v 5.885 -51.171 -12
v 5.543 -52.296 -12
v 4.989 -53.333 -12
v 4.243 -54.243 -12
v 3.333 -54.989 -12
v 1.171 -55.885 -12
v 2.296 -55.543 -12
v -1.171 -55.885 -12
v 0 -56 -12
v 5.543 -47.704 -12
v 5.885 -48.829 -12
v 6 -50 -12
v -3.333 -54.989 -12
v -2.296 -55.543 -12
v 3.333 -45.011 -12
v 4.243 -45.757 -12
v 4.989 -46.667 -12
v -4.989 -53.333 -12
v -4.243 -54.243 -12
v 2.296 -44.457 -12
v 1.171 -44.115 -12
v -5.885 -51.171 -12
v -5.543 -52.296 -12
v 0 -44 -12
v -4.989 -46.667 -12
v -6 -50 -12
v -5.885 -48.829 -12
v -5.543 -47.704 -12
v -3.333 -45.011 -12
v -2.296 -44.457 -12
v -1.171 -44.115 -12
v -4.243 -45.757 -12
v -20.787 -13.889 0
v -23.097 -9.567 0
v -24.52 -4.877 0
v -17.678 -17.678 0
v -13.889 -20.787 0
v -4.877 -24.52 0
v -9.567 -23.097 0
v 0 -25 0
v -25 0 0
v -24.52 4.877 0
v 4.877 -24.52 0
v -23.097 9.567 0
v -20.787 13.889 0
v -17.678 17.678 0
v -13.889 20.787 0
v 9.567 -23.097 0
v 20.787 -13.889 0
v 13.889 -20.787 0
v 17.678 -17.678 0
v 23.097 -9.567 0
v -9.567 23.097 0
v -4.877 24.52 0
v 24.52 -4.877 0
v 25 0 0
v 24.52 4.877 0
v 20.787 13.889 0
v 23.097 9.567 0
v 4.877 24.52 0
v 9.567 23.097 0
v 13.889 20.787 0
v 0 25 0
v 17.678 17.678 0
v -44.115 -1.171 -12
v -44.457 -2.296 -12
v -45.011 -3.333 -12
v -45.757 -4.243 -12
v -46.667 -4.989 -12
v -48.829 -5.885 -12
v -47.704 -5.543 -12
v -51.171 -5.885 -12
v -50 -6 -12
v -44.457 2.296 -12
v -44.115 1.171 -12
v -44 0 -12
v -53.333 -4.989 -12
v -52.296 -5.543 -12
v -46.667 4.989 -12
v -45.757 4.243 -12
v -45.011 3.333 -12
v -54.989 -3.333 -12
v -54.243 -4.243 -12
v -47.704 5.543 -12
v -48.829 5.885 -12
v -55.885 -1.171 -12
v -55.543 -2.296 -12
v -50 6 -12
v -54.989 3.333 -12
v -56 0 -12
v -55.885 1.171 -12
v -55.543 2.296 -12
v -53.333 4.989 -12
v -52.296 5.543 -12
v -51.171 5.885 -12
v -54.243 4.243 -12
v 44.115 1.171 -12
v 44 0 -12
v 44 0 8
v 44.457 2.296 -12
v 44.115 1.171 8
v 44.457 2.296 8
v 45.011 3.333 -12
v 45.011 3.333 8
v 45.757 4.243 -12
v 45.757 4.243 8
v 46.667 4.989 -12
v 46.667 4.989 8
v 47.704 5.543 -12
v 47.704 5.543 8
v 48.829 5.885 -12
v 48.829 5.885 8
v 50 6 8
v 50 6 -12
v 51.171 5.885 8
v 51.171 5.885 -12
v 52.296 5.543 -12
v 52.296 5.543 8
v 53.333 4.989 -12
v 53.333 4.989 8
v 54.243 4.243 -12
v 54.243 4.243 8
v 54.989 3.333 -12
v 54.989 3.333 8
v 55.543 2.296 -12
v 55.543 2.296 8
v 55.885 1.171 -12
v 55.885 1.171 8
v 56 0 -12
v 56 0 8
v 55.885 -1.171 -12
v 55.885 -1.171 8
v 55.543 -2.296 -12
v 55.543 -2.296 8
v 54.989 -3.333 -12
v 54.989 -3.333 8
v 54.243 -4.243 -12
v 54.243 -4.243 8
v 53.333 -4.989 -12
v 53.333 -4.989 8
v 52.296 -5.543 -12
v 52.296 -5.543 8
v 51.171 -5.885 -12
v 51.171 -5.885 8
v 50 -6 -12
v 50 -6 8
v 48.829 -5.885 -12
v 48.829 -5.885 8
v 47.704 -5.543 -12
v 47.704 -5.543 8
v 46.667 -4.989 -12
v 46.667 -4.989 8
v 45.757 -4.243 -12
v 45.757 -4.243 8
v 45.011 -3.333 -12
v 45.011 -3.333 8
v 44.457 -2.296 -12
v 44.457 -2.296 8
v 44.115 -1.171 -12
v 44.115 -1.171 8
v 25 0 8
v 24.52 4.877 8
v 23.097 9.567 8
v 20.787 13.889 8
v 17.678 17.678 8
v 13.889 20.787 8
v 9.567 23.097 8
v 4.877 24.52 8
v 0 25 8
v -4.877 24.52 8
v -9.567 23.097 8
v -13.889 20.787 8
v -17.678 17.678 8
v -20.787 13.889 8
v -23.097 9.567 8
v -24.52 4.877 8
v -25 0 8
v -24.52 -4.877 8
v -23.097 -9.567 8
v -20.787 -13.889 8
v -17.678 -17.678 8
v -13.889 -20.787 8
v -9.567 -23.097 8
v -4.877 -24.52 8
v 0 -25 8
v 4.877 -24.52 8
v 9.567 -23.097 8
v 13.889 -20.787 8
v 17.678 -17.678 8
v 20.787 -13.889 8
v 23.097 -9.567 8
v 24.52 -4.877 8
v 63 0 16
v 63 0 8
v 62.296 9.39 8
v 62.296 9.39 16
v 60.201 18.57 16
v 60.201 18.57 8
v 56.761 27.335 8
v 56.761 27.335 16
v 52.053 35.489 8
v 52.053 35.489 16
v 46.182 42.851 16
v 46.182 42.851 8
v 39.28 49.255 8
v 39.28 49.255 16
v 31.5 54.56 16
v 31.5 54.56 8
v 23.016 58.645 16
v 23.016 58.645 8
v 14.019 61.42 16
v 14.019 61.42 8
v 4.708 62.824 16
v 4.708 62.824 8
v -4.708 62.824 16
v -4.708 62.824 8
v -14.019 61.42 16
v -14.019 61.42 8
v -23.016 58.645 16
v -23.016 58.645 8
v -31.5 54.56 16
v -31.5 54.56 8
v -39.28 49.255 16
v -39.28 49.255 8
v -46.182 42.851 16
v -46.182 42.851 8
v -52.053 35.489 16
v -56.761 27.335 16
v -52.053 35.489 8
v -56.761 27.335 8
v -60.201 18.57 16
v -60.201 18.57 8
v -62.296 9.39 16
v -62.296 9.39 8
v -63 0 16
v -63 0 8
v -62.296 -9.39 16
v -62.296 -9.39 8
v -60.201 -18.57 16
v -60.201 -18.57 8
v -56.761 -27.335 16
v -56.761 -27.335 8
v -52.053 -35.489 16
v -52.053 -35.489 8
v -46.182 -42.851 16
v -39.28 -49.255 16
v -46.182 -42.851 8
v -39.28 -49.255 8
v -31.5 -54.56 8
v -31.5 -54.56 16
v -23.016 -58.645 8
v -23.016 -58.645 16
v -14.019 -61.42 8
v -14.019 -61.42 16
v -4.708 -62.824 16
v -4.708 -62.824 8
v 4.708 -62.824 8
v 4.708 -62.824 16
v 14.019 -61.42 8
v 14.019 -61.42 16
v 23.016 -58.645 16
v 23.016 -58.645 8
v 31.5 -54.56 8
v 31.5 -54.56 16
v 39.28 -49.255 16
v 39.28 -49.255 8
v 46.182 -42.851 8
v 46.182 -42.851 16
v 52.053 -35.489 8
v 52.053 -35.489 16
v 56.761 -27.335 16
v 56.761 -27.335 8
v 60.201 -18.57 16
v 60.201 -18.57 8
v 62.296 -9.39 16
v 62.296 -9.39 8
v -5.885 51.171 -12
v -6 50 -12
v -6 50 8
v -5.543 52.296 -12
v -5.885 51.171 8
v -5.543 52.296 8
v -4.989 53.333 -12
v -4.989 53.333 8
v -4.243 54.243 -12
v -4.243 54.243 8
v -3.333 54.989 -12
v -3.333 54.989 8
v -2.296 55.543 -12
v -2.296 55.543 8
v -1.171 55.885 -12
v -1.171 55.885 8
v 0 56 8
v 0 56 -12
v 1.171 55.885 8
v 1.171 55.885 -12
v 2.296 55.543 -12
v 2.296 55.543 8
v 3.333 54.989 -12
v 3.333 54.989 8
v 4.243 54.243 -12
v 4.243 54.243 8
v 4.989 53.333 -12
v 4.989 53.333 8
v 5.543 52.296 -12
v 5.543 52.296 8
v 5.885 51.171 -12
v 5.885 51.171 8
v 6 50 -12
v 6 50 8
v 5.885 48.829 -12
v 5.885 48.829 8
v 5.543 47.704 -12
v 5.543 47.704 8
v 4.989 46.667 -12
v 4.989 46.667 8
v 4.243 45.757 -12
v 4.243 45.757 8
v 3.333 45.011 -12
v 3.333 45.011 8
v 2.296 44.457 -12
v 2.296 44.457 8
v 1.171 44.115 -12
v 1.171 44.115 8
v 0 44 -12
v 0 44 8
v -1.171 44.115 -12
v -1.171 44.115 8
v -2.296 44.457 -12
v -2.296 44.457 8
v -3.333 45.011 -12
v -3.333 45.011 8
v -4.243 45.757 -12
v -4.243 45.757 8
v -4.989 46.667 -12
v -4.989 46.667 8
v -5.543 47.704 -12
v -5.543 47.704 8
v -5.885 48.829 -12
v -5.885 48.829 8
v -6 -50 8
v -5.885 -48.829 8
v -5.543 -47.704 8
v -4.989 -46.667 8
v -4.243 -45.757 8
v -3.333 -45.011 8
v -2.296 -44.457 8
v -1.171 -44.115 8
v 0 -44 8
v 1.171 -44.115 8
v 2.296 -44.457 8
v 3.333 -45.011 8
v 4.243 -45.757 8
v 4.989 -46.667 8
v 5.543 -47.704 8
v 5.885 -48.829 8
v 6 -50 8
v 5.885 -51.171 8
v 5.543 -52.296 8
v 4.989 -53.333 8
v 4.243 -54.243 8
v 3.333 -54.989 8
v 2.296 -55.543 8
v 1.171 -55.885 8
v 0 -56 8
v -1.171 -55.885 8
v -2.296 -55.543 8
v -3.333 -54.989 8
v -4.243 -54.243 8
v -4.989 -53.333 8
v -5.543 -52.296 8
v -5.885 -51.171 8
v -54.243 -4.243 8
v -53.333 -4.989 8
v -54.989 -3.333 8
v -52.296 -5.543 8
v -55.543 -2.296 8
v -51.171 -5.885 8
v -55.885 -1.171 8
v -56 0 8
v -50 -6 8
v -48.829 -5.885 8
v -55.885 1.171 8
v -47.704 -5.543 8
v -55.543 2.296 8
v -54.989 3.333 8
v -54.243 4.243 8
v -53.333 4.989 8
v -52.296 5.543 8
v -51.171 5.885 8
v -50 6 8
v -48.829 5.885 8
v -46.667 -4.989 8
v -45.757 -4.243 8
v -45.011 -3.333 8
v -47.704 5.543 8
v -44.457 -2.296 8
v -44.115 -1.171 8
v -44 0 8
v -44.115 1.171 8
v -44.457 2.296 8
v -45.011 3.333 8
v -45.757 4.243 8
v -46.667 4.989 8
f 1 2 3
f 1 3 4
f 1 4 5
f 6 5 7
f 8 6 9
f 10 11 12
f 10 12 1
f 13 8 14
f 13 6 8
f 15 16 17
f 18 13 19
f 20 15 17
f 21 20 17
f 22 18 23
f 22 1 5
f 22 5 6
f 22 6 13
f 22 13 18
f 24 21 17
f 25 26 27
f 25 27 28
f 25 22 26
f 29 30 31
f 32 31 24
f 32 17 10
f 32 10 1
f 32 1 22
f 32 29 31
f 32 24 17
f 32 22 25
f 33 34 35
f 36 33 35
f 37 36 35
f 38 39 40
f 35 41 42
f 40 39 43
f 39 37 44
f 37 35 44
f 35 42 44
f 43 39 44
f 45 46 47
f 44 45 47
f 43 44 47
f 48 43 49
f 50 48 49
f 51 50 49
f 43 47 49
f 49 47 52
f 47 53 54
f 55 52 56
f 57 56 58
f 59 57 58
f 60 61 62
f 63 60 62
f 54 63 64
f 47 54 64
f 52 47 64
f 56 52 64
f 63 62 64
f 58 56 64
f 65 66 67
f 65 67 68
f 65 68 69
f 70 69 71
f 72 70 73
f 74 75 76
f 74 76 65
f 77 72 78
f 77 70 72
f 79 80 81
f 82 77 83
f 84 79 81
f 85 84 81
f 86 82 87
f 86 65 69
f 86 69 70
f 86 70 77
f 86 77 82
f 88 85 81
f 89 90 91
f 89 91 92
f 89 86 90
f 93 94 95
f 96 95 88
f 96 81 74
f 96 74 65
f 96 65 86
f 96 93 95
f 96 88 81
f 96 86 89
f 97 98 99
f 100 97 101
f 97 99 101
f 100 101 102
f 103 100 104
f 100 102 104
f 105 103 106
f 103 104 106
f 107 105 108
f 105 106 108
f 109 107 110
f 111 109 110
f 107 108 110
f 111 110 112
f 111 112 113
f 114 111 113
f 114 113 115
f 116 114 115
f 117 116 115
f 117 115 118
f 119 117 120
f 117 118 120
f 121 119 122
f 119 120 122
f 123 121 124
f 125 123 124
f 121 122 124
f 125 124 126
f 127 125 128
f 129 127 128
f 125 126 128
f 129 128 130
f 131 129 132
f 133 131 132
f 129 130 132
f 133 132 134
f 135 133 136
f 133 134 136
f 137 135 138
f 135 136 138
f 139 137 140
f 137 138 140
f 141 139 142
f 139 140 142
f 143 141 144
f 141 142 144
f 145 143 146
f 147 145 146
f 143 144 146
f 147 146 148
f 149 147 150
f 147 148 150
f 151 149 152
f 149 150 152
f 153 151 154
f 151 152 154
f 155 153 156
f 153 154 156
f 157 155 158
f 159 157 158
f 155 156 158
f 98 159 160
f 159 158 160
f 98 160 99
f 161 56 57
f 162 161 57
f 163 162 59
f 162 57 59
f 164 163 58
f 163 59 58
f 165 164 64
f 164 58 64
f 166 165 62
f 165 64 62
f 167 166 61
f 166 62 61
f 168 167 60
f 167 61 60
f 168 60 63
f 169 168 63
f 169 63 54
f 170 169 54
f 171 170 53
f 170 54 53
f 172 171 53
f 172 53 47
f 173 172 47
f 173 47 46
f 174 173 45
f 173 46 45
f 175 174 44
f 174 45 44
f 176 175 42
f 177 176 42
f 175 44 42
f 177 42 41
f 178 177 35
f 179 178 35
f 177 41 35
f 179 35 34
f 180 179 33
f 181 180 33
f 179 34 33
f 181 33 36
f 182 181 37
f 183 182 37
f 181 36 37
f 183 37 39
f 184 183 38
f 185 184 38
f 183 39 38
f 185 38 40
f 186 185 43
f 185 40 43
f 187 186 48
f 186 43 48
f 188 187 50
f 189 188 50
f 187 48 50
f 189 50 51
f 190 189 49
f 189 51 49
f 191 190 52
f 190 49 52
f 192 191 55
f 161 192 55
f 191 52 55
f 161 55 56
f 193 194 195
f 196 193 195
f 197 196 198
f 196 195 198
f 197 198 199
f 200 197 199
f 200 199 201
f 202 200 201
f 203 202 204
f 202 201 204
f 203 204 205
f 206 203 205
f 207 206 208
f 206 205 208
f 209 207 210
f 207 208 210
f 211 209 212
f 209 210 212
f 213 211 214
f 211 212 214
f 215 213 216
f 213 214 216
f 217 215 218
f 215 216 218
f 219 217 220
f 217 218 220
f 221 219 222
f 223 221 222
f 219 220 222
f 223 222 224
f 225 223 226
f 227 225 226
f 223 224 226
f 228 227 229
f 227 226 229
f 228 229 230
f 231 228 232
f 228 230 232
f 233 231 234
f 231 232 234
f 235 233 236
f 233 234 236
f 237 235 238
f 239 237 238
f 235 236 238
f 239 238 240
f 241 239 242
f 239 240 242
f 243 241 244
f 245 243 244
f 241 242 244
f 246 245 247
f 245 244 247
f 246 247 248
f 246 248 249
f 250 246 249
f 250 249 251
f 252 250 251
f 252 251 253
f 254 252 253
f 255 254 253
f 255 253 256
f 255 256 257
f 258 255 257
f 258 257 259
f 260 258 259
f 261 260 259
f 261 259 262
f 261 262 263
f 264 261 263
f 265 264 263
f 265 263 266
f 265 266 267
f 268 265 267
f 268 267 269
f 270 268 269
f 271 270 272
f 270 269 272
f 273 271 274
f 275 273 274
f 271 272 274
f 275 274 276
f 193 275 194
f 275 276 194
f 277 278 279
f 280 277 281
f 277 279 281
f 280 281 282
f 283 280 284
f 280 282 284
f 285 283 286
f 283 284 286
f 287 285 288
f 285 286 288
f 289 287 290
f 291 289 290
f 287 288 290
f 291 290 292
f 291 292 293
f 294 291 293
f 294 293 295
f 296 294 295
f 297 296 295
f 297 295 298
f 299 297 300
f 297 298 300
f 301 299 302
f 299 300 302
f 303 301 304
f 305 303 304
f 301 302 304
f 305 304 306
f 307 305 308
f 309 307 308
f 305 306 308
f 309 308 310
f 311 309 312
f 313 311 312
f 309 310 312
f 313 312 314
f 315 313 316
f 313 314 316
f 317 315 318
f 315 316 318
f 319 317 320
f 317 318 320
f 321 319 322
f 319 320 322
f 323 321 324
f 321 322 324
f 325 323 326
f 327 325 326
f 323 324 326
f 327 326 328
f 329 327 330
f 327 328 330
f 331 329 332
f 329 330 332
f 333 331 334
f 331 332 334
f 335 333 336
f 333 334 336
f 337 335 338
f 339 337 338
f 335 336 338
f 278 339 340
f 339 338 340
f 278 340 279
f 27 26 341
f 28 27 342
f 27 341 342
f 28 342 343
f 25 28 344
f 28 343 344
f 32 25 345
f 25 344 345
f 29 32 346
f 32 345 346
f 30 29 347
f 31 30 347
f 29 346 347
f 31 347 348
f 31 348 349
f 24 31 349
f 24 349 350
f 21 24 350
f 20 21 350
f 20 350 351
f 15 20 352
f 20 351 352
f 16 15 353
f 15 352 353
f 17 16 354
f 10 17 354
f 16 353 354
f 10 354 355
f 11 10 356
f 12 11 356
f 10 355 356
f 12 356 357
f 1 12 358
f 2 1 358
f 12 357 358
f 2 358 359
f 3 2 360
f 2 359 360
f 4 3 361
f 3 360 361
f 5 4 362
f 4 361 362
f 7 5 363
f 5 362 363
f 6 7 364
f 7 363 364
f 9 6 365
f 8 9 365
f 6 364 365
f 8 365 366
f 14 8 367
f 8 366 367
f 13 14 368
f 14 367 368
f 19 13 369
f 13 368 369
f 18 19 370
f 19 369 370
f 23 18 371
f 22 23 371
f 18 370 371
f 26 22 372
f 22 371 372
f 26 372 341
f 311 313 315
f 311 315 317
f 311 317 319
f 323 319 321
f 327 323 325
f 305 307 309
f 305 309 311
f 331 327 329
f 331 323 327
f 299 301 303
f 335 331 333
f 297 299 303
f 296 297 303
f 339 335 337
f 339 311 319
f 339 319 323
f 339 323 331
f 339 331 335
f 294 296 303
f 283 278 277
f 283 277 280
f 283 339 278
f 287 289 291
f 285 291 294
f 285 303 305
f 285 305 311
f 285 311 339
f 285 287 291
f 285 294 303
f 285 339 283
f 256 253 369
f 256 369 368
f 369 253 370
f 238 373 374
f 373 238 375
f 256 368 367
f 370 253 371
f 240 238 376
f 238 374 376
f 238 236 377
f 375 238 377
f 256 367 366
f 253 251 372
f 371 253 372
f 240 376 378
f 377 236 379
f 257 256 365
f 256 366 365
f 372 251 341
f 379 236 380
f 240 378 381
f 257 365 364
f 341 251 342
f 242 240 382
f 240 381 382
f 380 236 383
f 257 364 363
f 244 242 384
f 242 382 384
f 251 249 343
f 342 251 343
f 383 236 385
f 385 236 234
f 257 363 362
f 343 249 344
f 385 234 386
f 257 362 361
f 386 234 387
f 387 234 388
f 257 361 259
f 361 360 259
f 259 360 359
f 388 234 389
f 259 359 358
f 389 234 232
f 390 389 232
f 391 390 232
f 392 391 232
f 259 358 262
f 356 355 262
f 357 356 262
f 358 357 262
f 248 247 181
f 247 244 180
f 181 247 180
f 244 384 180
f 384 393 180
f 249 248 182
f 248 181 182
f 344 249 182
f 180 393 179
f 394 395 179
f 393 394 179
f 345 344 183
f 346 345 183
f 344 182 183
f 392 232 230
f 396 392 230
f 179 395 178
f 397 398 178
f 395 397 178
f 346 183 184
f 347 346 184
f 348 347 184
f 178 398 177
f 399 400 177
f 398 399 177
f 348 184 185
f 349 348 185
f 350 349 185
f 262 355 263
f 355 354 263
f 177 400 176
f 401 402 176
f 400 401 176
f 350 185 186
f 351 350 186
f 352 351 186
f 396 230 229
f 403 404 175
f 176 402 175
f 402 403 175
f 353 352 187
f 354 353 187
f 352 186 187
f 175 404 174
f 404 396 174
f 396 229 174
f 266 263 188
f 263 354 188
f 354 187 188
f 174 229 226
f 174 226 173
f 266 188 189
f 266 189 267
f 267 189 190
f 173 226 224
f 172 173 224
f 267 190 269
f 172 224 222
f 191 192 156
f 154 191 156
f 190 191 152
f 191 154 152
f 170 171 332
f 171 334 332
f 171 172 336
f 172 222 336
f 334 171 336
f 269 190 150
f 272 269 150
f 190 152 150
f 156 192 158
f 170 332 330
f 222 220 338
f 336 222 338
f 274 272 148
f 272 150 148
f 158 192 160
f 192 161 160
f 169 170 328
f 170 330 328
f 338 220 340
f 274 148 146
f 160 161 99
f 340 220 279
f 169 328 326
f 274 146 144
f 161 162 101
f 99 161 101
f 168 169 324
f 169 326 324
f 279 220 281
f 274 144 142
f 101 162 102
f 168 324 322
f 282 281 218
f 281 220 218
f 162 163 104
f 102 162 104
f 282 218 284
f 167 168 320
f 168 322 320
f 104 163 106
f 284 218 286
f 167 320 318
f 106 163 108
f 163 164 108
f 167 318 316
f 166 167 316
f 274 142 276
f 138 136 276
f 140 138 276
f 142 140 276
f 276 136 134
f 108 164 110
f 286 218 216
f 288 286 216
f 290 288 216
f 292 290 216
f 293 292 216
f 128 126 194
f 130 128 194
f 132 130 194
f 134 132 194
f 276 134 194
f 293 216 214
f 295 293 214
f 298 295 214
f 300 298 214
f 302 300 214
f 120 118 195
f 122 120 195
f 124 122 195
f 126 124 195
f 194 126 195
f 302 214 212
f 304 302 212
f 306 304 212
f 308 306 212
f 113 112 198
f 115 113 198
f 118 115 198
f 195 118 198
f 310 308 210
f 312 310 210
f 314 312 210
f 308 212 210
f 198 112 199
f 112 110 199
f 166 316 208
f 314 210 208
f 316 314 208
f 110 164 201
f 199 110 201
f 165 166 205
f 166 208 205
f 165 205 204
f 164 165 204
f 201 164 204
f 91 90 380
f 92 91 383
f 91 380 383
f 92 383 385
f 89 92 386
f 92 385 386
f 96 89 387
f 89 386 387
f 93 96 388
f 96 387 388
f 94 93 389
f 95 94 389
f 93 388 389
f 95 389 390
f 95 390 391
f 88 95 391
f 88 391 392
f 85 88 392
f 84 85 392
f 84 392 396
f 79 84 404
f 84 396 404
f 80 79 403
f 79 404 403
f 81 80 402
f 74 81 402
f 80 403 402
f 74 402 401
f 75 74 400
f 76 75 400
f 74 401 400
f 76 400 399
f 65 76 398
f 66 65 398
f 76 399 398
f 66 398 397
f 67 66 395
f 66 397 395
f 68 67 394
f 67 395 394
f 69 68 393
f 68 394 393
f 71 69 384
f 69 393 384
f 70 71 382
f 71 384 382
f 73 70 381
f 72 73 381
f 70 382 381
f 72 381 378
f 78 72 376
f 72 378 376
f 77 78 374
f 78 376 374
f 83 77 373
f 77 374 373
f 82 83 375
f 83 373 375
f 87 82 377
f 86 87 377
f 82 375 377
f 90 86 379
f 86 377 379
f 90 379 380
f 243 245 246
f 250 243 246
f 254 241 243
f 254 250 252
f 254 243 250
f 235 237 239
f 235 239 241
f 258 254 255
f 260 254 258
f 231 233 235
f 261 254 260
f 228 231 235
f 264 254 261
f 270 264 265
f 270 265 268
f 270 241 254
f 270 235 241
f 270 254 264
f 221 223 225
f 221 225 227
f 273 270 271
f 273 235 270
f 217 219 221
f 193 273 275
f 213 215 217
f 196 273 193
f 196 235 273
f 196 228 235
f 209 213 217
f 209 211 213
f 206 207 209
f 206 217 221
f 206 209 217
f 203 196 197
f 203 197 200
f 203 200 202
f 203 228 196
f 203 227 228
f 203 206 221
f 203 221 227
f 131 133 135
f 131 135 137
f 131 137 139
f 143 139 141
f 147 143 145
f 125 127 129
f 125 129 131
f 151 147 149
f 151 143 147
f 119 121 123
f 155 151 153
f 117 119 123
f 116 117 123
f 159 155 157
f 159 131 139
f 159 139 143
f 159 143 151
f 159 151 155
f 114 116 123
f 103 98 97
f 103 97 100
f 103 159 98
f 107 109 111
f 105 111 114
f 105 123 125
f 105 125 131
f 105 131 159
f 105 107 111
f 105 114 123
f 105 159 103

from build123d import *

# Parameters (mm, degrees)
SKETCH1_R           = 25
BOSS_EXTRUDE1_DEPTH = 8
SKETCH2_R           = 63
BOSS_EXTRUDE2_DEPTH = 8
SKETCH4_R           = 6
BOSS_EXTRUDE3_DEPTH = 20


with BuildPart() as part:
    # Sketch1 → Boss-Extrude1 (new body)
    with BuildSketch(Plane.XY):
        Circle(SKETCH1_R)
    extrude(amount=BOSS_EXTRUDE1_DEPTH)

    # Sketch2 → Boss-Extrude2 (add)
    with BuildSketch(Plane.XY.offset(8)):
        Circle(SKETCH2_R)
    extrude(amount=BOSS_EXTRUDE2_DEPTH)

    # Sketch4 → Boss-Extrude3 (add)
    with BuildSketch(Plane(origin=(0, 0, 8), x_dir=(-1, 0, 0), z_dir=(0, 0, -1))):
        with Locations((0, 50)):
            Circle(SKETCH4_R)
        with Locations((50, 0)):
            Circle(SKETCH4_R)
        with Locations((0, -50)):
            Circle(SKETCH4_R)
        with Locations((-50, 0)):
            Circle(SKETCH4_R)
    extrude(amount=BOSS_EXTRUDE3_DEPTH)


solid = part.part
